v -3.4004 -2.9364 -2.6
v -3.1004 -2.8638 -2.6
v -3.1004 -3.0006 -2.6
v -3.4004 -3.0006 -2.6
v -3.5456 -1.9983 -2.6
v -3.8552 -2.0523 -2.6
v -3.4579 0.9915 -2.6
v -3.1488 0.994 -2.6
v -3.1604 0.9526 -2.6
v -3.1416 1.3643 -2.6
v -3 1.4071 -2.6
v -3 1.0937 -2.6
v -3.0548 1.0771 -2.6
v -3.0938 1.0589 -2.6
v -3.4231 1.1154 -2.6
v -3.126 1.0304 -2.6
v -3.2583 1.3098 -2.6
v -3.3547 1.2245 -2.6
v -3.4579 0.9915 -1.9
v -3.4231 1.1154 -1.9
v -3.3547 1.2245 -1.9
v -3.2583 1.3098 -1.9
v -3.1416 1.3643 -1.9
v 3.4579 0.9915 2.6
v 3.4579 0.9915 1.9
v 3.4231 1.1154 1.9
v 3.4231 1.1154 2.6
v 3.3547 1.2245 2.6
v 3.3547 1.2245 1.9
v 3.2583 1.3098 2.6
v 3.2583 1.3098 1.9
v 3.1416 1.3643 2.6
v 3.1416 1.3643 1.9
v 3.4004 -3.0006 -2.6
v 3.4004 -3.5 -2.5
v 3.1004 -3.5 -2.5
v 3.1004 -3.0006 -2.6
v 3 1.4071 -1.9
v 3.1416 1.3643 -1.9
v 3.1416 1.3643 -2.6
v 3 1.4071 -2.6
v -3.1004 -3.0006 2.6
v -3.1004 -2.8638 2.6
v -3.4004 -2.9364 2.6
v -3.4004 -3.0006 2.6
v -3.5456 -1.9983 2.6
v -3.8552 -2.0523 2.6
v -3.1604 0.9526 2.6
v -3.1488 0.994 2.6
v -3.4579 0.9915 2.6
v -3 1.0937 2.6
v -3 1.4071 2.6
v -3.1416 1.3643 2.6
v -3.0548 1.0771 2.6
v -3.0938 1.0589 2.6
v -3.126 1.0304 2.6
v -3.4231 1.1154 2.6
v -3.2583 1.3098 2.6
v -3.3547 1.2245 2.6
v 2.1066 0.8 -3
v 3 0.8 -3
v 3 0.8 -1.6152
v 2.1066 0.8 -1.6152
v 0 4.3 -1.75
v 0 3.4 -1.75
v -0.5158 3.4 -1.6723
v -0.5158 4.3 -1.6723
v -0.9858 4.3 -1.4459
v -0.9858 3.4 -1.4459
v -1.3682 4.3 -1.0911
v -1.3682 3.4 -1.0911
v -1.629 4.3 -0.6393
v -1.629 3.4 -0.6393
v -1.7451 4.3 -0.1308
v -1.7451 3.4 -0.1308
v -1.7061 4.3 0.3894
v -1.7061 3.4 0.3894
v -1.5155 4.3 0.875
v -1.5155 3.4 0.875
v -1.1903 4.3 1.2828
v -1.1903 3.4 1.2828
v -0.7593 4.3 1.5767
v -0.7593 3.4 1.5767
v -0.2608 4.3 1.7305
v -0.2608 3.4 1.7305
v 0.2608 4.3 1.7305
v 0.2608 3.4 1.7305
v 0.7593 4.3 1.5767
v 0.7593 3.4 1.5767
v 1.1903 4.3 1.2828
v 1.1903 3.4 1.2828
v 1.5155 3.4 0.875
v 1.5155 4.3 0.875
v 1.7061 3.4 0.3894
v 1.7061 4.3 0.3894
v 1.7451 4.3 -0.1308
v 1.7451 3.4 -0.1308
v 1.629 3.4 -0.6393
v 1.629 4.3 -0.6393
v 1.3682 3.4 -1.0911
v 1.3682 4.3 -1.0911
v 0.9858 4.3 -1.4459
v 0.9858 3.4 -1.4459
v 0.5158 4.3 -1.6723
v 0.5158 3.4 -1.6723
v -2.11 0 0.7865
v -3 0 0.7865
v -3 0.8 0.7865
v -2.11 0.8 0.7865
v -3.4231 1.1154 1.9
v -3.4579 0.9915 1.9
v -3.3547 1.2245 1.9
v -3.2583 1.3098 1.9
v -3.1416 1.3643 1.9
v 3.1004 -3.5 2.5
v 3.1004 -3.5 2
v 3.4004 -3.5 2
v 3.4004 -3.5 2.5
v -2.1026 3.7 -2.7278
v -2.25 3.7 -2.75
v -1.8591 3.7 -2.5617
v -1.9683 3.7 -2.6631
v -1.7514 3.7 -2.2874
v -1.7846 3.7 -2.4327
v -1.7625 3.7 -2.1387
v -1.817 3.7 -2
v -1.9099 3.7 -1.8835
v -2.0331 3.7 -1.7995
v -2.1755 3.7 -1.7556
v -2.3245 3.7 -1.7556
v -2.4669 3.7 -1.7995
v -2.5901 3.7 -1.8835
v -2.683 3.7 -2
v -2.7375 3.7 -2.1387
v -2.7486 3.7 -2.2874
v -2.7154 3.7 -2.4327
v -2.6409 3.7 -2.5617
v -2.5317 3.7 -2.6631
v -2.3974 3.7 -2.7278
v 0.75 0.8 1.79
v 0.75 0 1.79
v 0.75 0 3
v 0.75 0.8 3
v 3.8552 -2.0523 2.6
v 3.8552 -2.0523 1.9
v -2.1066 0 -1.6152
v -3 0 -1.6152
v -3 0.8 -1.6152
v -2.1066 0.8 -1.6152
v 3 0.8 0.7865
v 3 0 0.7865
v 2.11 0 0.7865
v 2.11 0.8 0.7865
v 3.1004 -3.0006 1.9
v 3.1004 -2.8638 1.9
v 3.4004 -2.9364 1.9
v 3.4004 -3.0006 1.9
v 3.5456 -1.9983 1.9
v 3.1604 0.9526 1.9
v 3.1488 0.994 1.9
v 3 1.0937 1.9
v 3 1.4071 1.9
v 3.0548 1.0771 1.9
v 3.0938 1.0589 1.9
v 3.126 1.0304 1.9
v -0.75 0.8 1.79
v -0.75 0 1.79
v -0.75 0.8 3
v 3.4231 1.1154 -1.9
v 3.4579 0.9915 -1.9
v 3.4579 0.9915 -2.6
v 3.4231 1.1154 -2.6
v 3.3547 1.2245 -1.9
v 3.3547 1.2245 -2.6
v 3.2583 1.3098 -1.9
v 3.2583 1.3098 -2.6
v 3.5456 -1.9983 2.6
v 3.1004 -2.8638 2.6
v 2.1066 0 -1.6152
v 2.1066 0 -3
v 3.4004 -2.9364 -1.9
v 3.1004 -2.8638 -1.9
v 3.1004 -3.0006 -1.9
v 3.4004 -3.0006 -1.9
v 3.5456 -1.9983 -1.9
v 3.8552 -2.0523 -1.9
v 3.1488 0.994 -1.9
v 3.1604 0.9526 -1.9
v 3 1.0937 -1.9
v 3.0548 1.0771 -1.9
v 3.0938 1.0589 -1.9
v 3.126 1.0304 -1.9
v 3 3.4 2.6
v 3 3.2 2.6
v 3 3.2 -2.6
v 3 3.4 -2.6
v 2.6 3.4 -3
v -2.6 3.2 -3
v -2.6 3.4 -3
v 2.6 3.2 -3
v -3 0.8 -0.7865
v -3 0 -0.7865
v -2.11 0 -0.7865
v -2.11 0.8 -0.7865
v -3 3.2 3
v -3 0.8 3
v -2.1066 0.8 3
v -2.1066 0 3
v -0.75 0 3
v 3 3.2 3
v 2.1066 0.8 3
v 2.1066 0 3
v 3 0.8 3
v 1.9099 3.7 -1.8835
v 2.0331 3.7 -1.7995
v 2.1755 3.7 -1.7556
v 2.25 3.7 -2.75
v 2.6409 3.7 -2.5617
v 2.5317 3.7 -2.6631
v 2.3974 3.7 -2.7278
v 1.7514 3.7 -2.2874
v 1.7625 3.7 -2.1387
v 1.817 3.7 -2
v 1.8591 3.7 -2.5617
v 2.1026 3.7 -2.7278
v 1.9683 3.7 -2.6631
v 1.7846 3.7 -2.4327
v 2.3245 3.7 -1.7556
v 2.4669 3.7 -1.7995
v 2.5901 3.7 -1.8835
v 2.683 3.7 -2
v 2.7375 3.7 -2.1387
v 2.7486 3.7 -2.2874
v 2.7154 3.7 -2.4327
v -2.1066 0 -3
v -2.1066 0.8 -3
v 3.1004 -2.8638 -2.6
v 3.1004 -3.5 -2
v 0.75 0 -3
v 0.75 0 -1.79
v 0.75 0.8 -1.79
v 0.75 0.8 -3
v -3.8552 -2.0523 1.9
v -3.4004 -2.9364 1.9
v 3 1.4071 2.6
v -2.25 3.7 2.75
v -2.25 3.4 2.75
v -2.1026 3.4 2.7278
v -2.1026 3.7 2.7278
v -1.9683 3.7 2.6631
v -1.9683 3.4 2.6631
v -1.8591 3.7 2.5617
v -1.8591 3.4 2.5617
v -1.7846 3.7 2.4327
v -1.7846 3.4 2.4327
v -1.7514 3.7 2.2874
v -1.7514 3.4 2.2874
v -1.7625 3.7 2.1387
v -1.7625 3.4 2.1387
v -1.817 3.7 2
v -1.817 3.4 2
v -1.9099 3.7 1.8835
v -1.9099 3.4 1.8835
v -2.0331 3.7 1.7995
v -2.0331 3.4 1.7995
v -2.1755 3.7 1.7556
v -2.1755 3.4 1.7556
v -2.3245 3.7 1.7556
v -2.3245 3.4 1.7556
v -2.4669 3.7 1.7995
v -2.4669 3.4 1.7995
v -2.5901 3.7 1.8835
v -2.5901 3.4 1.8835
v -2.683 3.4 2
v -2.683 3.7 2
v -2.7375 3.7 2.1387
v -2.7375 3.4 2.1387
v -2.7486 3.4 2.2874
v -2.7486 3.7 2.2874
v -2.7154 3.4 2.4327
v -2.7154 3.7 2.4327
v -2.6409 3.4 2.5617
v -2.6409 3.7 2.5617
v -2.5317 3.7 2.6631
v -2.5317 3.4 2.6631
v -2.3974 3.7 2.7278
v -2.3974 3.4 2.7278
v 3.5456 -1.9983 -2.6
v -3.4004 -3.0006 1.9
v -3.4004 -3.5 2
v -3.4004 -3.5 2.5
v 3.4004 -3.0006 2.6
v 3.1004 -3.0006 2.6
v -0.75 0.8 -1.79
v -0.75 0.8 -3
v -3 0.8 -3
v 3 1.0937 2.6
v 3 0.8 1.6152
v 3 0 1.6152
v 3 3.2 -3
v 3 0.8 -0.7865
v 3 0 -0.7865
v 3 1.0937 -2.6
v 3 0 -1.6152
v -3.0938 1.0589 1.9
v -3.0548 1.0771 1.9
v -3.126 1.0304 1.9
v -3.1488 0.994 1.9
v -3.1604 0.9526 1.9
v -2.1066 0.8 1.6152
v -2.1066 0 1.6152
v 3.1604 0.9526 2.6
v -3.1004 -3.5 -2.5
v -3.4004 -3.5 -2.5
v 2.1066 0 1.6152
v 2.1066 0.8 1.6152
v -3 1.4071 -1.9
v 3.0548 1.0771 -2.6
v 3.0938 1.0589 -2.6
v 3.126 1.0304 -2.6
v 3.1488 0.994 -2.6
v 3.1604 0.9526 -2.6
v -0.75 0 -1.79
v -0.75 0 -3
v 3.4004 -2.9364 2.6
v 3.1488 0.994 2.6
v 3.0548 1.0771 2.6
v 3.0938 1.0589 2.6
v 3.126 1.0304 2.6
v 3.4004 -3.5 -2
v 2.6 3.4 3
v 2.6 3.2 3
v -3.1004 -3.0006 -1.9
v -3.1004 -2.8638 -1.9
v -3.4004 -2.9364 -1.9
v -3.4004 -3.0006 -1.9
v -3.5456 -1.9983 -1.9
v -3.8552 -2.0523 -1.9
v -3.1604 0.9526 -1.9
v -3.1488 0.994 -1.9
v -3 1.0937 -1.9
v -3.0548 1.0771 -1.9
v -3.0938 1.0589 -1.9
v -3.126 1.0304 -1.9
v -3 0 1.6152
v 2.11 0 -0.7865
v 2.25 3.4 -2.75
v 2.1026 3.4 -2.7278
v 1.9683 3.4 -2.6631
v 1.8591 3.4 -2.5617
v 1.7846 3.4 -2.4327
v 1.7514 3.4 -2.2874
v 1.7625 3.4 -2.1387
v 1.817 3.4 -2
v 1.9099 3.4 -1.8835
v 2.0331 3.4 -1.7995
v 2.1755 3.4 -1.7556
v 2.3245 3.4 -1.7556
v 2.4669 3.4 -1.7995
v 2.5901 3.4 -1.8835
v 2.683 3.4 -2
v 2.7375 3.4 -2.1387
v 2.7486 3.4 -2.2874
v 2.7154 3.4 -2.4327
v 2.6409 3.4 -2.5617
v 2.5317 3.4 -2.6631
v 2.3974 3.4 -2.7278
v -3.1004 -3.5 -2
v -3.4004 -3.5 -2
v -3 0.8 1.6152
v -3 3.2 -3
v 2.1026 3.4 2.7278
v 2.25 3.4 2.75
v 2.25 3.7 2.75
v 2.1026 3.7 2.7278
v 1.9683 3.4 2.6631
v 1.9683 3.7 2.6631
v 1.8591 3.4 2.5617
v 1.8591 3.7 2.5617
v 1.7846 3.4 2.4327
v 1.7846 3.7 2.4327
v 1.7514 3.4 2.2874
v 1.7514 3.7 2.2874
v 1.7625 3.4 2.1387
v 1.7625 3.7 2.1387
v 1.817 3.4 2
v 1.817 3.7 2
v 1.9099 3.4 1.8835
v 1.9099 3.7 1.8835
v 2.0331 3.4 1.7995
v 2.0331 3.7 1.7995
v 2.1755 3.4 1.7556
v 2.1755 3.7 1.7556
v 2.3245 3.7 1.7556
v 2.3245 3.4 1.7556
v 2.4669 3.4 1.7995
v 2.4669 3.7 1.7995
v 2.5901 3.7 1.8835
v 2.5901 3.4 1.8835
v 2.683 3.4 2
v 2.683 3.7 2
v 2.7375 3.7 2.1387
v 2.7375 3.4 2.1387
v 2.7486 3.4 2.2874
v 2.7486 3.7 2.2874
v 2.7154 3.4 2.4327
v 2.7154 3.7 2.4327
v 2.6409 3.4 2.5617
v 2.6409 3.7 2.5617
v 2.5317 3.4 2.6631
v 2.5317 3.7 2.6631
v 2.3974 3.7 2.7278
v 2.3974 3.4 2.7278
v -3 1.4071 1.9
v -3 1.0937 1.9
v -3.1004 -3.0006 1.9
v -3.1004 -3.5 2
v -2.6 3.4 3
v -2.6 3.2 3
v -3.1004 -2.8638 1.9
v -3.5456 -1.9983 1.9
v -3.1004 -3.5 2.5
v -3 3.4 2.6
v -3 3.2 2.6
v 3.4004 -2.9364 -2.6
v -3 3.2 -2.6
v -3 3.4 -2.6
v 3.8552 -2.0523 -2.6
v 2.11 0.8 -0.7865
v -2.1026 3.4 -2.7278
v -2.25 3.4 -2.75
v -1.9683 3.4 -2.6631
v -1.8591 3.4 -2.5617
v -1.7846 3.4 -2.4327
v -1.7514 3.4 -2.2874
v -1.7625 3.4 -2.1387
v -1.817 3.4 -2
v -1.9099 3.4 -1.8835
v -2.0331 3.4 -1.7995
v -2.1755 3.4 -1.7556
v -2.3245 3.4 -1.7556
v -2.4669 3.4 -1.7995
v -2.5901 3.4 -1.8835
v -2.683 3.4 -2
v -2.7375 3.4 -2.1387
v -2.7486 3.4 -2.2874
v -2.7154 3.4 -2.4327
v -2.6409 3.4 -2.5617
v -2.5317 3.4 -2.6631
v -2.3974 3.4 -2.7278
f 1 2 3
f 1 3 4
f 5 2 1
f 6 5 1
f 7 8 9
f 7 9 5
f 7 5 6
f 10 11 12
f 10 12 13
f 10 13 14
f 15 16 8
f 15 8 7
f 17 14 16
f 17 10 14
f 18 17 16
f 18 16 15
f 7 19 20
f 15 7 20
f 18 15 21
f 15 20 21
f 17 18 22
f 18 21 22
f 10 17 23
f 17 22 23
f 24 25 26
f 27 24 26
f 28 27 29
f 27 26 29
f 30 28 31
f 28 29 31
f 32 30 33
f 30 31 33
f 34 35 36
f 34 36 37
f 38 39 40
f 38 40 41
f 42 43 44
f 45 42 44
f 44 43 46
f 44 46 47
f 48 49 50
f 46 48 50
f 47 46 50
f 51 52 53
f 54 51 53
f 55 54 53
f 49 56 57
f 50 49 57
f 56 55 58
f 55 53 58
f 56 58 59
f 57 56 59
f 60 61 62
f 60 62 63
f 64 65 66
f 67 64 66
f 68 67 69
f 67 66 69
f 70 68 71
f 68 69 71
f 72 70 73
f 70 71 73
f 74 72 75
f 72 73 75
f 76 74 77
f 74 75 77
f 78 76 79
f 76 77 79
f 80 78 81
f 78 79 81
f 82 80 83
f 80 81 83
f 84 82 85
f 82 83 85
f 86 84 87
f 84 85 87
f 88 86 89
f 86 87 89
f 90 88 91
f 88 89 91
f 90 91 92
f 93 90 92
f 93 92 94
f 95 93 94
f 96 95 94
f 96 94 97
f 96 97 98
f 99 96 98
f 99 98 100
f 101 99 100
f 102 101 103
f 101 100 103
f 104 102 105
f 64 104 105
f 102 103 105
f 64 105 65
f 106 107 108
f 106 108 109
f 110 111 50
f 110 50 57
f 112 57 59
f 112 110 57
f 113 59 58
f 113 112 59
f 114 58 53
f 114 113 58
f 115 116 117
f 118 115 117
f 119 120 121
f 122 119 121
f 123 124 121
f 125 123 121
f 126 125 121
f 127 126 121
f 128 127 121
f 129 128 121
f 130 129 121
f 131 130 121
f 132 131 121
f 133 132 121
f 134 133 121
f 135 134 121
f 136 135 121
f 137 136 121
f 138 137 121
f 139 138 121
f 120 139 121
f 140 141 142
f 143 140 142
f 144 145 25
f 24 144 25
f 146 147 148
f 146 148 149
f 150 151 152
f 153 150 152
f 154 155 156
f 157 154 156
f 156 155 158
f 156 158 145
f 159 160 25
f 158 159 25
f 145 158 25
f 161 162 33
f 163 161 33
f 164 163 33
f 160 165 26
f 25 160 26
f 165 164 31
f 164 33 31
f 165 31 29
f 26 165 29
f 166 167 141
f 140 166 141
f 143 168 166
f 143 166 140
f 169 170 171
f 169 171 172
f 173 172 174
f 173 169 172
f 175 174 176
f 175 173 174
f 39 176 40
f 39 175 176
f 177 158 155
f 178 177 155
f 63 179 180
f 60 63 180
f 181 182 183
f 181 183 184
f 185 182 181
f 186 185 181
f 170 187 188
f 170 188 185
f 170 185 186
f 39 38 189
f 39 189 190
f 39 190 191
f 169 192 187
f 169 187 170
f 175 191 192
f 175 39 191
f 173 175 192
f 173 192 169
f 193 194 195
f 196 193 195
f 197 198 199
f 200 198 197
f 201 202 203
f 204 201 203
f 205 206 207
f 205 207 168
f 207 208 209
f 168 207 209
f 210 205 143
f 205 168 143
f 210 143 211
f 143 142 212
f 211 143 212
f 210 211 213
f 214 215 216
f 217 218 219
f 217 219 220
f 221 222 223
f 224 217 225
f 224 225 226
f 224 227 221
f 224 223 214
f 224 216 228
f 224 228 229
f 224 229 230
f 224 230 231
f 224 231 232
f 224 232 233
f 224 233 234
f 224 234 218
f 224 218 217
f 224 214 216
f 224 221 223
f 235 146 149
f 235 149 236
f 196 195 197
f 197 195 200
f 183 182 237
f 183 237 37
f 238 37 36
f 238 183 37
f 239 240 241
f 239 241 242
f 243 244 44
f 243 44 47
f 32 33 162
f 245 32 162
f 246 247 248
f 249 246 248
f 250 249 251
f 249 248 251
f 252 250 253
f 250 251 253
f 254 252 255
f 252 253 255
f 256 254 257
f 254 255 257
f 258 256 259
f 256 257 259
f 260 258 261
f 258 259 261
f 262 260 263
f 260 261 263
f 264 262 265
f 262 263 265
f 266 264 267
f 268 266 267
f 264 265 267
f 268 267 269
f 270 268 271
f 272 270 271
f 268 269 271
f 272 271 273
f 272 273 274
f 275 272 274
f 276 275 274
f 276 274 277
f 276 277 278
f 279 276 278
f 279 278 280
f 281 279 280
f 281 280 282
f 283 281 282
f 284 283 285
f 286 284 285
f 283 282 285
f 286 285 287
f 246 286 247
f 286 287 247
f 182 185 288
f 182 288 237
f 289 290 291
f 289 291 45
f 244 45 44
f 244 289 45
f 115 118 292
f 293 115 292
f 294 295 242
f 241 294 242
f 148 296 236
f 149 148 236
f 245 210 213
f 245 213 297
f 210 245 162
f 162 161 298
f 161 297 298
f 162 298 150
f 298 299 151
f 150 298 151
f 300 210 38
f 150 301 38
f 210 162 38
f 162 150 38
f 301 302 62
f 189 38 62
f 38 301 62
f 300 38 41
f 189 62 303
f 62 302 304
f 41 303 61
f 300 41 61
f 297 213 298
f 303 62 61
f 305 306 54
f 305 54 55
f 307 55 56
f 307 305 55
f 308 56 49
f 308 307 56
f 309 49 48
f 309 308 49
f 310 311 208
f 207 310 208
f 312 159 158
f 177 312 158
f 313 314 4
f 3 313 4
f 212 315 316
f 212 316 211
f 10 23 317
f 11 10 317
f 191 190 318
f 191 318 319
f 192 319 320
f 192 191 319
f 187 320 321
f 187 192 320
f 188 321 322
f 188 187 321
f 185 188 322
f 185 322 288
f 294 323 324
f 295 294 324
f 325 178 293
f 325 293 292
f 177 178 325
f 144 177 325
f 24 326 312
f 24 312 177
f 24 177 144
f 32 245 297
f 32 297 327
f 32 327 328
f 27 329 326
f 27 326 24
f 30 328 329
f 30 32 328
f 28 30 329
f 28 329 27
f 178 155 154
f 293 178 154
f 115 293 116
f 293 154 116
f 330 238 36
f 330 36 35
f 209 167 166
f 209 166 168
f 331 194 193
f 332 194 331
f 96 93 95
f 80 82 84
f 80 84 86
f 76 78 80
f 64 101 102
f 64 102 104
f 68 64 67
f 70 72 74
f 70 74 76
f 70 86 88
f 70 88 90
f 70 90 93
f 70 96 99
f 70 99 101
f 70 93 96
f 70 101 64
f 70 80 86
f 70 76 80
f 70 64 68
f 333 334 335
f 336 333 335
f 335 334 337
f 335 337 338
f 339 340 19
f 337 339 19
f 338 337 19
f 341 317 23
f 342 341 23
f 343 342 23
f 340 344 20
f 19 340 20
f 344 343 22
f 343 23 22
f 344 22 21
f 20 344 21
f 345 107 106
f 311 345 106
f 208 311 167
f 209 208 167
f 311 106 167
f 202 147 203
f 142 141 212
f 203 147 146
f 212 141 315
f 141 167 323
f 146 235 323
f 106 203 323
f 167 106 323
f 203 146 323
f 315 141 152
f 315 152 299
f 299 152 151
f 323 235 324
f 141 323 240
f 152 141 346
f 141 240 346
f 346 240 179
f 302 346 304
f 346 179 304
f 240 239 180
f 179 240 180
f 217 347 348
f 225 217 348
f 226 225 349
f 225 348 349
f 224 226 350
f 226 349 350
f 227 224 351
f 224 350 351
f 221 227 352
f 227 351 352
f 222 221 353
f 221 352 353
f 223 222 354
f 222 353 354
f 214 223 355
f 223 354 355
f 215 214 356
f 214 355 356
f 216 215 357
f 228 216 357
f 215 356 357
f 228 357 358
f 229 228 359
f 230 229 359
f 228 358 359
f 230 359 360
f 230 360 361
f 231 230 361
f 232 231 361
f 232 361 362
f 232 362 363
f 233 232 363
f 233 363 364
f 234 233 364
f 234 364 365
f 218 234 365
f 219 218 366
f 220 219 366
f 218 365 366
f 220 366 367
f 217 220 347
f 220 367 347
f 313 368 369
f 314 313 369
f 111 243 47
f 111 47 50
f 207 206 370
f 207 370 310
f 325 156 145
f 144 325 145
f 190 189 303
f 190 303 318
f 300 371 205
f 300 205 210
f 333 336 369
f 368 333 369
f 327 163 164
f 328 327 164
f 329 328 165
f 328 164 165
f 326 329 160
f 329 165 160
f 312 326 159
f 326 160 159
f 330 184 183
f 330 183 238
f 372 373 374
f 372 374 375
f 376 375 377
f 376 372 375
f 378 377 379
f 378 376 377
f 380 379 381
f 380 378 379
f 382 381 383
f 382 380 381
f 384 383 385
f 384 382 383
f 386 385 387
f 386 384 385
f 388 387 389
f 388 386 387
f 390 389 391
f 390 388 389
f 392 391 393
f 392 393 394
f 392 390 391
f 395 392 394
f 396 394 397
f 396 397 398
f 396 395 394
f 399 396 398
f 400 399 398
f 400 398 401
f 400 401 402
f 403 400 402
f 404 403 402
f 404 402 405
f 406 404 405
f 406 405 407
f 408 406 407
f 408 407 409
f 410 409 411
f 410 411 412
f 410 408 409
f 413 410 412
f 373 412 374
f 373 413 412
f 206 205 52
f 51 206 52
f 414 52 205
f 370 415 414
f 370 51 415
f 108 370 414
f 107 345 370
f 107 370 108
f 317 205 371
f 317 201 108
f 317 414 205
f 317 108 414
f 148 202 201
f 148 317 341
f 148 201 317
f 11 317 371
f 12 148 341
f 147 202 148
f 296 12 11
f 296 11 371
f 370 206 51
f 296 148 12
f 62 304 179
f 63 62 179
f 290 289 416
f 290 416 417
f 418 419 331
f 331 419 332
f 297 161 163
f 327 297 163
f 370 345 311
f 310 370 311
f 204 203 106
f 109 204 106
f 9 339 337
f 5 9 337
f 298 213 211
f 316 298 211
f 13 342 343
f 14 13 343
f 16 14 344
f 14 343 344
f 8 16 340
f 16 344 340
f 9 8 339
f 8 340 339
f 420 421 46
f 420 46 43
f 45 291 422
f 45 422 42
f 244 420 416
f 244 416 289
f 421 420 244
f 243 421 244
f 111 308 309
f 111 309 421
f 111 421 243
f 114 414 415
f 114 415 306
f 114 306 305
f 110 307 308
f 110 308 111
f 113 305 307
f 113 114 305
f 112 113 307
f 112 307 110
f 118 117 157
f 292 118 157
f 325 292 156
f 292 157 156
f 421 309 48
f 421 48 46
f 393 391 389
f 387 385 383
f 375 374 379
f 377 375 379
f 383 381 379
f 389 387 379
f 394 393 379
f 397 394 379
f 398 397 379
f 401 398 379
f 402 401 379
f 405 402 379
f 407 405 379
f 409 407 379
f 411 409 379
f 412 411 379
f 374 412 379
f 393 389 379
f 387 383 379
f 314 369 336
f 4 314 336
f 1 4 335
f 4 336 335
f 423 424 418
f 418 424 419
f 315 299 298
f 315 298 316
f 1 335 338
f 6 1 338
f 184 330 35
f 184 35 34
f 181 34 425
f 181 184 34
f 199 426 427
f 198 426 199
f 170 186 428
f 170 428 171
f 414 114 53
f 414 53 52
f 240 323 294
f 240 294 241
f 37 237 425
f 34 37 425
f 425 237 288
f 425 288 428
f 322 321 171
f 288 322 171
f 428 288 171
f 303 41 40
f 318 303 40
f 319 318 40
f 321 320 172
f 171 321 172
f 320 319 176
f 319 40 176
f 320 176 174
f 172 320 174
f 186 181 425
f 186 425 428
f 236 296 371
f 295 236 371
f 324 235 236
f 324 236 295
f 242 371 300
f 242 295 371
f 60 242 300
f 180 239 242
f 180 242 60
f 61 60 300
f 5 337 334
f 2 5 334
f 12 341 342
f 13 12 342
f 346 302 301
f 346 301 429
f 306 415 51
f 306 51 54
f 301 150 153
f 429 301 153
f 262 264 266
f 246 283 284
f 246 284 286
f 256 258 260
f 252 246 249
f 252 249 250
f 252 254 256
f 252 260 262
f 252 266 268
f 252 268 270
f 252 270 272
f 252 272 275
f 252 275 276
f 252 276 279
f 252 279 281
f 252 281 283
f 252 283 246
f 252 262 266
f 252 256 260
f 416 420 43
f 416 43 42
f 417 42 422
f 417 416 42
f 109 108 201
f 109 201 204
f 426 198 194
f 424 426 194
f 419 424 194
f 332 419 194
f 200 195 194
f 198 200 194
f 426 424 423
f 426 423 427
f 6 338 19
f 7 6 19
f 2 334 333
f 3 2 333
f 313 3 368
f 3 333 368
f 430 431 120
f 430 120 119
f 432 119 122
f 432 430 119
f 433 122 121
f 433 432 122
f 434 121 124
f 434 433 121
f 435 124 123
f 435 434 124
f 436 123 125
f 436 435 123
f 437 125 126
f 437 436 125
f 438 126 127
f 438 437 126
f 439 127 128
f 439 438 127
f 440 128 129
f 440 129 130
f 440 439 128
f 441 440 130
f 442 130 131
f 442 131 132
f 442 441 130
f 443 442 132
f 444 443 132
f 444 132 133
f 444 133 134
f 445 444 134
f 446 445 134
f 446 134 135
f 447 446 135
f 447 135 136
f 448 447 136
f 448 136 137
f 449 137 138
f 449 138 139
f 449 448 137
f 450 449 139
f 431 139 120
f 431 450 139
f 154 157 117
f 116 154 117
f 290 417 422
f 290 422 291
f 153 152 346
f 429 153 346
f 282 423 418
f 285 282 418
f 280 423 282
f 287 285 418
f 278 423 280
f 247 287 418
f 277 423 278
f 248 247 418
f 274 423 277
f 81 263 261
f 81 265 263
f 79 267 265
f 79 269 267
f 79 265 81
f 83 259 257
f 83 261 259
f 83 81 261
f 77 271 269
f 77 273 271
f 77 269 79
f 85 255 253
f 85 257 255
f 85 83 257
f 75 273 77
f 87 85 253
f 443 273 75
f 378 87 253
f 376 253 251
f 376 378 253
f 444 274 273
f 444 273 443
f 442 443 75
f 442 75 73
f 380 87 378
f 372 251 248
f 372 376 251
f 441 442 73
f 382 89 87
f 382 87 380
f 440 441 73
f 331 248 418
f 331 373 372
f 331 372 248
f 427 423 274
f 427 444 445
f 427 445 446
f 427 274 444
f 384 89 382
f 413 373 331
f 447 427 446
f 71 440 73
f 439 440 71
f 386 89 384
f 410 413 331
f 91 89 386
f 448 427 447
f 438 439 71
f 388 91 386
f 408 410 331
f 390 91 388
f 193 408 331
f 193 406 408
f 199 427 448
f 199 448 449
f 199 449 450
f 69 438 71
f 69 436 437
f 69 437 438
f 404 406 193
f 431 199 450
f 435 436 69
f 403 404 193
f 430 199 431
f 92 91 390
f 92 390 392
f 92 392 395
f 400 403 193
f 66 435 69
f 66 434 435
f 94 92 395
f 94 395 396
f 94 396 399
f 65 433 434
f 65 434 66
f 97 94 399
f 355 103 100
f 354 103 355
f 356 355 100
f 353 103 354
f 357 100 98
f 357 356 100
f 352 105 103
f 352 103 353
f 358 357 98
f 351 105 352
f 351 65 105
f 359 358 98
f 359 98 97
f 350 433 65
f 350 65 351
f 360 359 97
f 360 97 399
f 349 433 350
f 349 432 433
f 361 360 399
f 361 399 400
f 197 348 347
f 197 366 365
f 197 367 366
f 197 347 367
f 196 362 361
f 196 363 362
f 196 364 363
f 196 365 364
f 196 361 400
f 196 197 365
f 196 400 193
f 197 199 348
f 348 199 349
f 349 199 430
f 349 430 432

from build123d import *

# Parameters (mm, degrees)
CROQUIS1_W                  = 6
CROQUIS1_H                  = 6
SALIENTE_EXTRUIR1_DEPTH     = 3.4
CROQUIS2_R                  = 1.75
SALIENTE_EXTRUIR2_DEPTH     = 0.9
BARRER6_START               = 1.9
BARRER6_DEPTH               = 0.7
SIMETR_A2_START             = 1.9
SIMETR_A2_COPY_1_DEPTH      = 0.7
CROQUIS3_R                  = 0.5
SALIENTE_EXTRUIR6_DEPTH     = 0.3
SIMETR_A4_COPY_1_SKETCH_R   = 0.5
SIMETR_A4_COPY_1_DEPTH      = 0.3
CORTAR_EXTRUIR1_START       = -0.2
CORTAR_EXTRUIR1_DEPTH       = 9.654133443
SIMETR_A6_START             = -0.2
SIMETR_A6_COPY_1_DEPTH      = 9.654133443
CROQUIS13_W                 = 1.499904498
CROQUIS13_H                 = 1.21
CORTAR_EXTRUIR2_DEPTH       = 0.8
CROQUIS13_3_W               = 0.893400265
CROQUIS13_3_H               = 1.384843815
CROQUIS13_3_W_2             = 0.89
CROQUIS13_3_H_2             = 0.786473886
CORTAR_EXTRUIR3_DEPTH       = 0.8
SIMETR_A9_COPY_1_SKETCH_W   = 0.893400265
SIMETR_A9_COPY_1_SKETCH_H   = 1.384843815
SIMETR_A9_COPY_1_SKETCH_W_2 = 0.89
SIMETR_A9_COPY_1_SKETCH_H_2 = 0.786473886
SIMETR_A9_COPY_1_DEPTH      = 0.8
CORTAR_EXTRUIR4_DEPTH       = 0.3
SIMETR_A11_COPY_1_DEPTH     = 0.3


# Read off the part's stored shape, not the designer's step: Barrer6
with BuildPart() as part:
    # Croquis1 → Saliente-Extruir1 (new body)
    with BuildSketch(Plane(origin=(0, 0, 0), x_dir=(1, 0, 0), z_dir=(0, 1, 0))):
        Rectangle(CROQUIS1_W, CROQUIS1_H)
    extrude(amount=SALIENTE_EXTRUIR1_DEPTH)

    # Croquis2 → Saliente-Extruir2 (add)
    with BuildSketch(Plane(origin=(0, 3.4, 0), x_dir=(1, 0, 0), z_dir=(0, 1, 0))):
        with Locations(Location((0, 0, 0), (0, 0, 90))):
            Circle(CROQUIS2_R)
    extrude(amount=SALIENTE_EXTRUIR2_DEPTH)

    # Barrer6 outline → Barrer6 (add)
    with BuildSketch(Plane.XY.offset(BARRER6_START)):
        with BuildLine():
            Line((3, 1.407087545), (3, 1.0936793))
            Line((3, 1.0936793), (3.054816861, 1.077108111))
            ThreePointArc((3.054816861, 1.077108111), (3.12597159, 1.030446512), (3.160407685, 0.952636129))
            Line((3.160407685, 0.952636129), (3.545582768, -1.998261735))
            Line((3.545582768, -1.998261735), (3.100367019, -2.863770693))
            Line((3.100367019, -2.863770693), (3.100367019, -3.5))
            Line((3.100367019, -3.5), (3.400367019, -3.5))
            Line((3.400367019, -3.5), (3.400367019, -2.936407033))
            Line((3.400367019, -2.936407033), (3.855174739, -2.052251079))
            Line((3.855174739, -2.052251079), (3.457884247, 0.991465178))
            ThreePointArc((3.457884247, 0.991465178), (3.354744065, 1.224516485), (3.141627229, 1.364273499))
            Line((3.141627229, 1.364273499), (3, 1.407087545))
        make_face()
    barrer6 = extrude(amount=BARRER6_DEPTH)

    # Simetría1: Barrer6 across plane
    add(barrer6.mirror(Plane.XY))

    # Simetría2: Barrer6 across plane
    add(barrer6.mirror(Plane(origin=(0, 0, 0), x_dir=(0, 0, 1), z_dir=(1, 0, 0))))

    # Simetría2 copy 1 sketch → Simetría2 copy 1 (add)
    with BuildSketch(Plane(origin=(0, 0, 0), x_dir=(-1, 0, 0), z_dir=(0, 0, -1)).offset(SIMETR_A2_START)):
        with BuildLine():
            Line((3, 1.407087545), (3, 1.0936793))
            Line((3, 1.0936793), (3.054816861, 1.077108111))
            ThreePointArc((3.054816861, 1.077108111), (3.12597159, 1.030446512), (3.160407685, 0.952636129))
            Line((3.160407685, 0.952636129), (3.545582768, -1.998261735))
            Line((3.545582768, -1.998261735), (3.100367019, -2.863770693))
            Line((3.100367019, -2.863770693), (3.100367019, -3.5))
            Line((3.100367019, -3.5), (3.400367019, -3.5))
            Line((3.400367019, -3.5), (3.400367019, -2.936407033))
            Line((3.400367019, -2.936407033), (3.855174739, -2.052251079))
            Line((3.855174739, -2.052251079), (3.457884247, 0.991465178))
            ThreePointArc((3.457884247, 0.991465178), (3.354744065, 1.224516485), (3.141627229, 1.364273499))
            Line((3.141627229, 1.364273499), (3, 1.407087545))
        make_face()
    extrude(amount=SIMETR_A2_COPY_1_DEPTH)

    # Croquis3 → Saliente-Extruir6 (add)
    with BuildSketch(Plane(origin=(0, 3.4, 0), x_dir=(1, 0, 0), z_dir=(0, 1, 0))):
        with Locations(Location((2.25, 2.25, 0), (0, 0, 90))):
            Circle(CROQUIS3_R)
    saliente_extruir6 = extrude(amount=SALIENTE_EXTRUIR6_DEPTH)

    # Simetría3: Saliente-Extruir6 across plane
    add(saliente_extruir6.mirror(Plane(origin=(0, 0, 0), x_dir=(0, 0, 1), z_dir=(1, 0, 0))))

    # Simetría4: Saliente-Extruir6 across plane
    add(saliente_extruir6.mirror(Plane.XY))

    # Simetría4 copy 1 sketch → Simetría4 copy 1 (add)
    with BuildSketch(Plane(origin=(0, 3.4, 0), x_dir=(-1, 0, 0), z_dir=(0, 1, 0))):
        with Locations(Location((2.25, 2.25, 0), (0, 0, 90))):
            Circle(SIMETR_A4_COPY_1_SKETCH_R)
    extrude(amount=SIMETR_A4_COPY_1_DEPTH)

    # Croquis12 → Cortar-Extruir1 (cut)
    with BuildSketch(Plane(origin=(0, 3.4, 0), x_dir=(1, 0, 0), z_dir=(0, 1, 0)).offset(CORTAR_EXTRUIR1_START)):
        Polygon((-22.58932813, -16.98932813), (-3, 2.6), (-2.6, 3), (16.98932813, 22.58932813), (-22.18932813, 61.767984391), (-61.767984391, 22.18932813), align=None)
    cortar_extruir1 = extrude(amount=CORTAR_EXTRUIR1_DEPTH, mode=Mode.SUBTRACT)

    # Simetría5: Cortar-Extruir1 across plane
    add(cortar_extruir1.mirror(Plane.XY), mode=Mode.SUBTRACT)

    # Simetría6: Cortar-Extruir1 across plane
    add(cortar_extruir1.mirror(Plane(origin=(0, 0, 0), x_dir=(0, 0, 1), z_dir=(1, 0, 0))), mode=Mode.SUBTRACT)

    # Simetría6 copy 1 sketch → Simetría6 copy 1 (cut)
    with BuildSketch(Plane(origin=(0, 3.4, 0), x_dir=(-1, 0, 0), z_dir=(0, 1, 0)).offset(SIMETR_A6_START)):
        Polygon((-22.58932813, -16.98932813), (-3, 2.6), (-2.6, 3), (16.98932813, 22.58932813), (-22.18932813, 61.767984391), (-61.767984391, 22.18932813), align=None)
    extrude(amount=SIMETR_A6_COPY_1_DEPTH, mode=Mode.SUBTRACT)


with BuildPart() as body_2:
    # Partir1: the piece on the far side of the plane
    add(part.part)
    split(bisect_by=Plane.ZX.offset(3.2), keep=Keep.BOTTOM)

    # Croquis13 → Cortar-Extruir2 (cut)
    with BuildSketch(Plane.XZ):
        with Locations((0, 2.395)):
            Rectangle(CROQUIS13_W, CROQUIS13_H)
    cortar_extruir2 = extrude(amount=-CORTAR_EXTRUIR2_DEPTH, mode=Mode.SUBTRACT)

    # Simetría7: Cortar-Extruir2 across plane
    add(cortar_extruir2.mirror(Plane.XY), mode=Mode.SUBTRACT)

    # Croquis13<3> → Cortar-Extruir3 (cut)
    with BuildSketch(Plane.XZ):
        with Locations((-2.553299867, 2.307578093)):
            Rectangle(CROQUIS13_3_W, CROQUIS13_3_H)
        with Locations((-2.555, 0.393236943)):
            Rectangle(CROQUIS13_3_W_2, CROQUIS13_3_H_2)
    cortar_extruir3 = extrude(amount=-CORTAR_EXTRUIR3_DEPTH, mode=Mode.SUBTRACT)

    # Simetría8: Cortar-Extruir3 across plane
    add(cortar_extruir3.mirror(Plane.XY), mode=Mode.SUBTRACT)

    # Simetría9: Cortar-Extruir3 across plane
    add(cortar_extruir3.mirror(Plane(origin=(0, 0, 0), x_dir=(0, 0, 1), z_dir=(1, 0, 0))), mode=Mode.SUBTRACT)

    # Simetría9 copy 1 sketch → Simetría9 copy 1 (cut)
    with BuildSketch(Plane(origin=(0, 0, 0), x_dir=(-1, 0, 0), z_dir=(0, -1, 0))):
        with Locations((-2.553299867, 2.307578093)):
            Rectangle(SIMETR_A9_COPY_1_SKETCH_W, SIMETR_A9_COPY_1_SKETCH_H)
        with Locations((-2.555, 0.393236943)):
            Rectangle(SIMETR_A9_COPY_1_SKETCH_W_2, SIMETR_A9_COPY_1_SKETCH_H_2)
    extrude(amount=-SIMETR_A9_COPY_1_DEPTH, mode=Mode.SUBTRACT)

    # Croquis14 → Cortar-Extruir4 (cut)
    with BuildSketch(Plane(origin=(3.400367019, 0, 0), x_dir=(0, 0, -1), z_dir=(1, 0, 0))):
        Polygon((-2.6, -3.5), (-2.5, -3.5), (-2.6, -3.000601878), align=None)
        Polygon((-1.9, -3.000601878), (-2, -3.5), (-1.9, -3.5), align=None)
    cortar_extruir4 = extrude(amount=-CORTAR_EXTRUIR4_DEPTH, mode=Mode.SUBTRACT)

    # Simetría10: Cortar-Extruir4 across plane
    add(cortar_extruir4.mirror(Plane.XY), mode=Mode.SUBTRACT)

    # Simetría11: Cortar-Extruir4 across plane
    add(cortar_extruir4.mirror(Plane(origin=(0, 0, 0), x_dir=(0, 0, 1), z_dir=(1, 0, 0))), mode=Mode.SUBTRACT)

    # Simetría11 copy 1 sketch → Simetría11 copy 1 (cut)
    with BuildSketch(Plane.ZY.offset(3.400367019)):
        Polygon((-2.6, -3.5), (-2.5, -3.5), (-2.6, -3.000601878), align=None)
        Polygon((-1.9, -3.000601878), (-2, -3.5), (-1.9, -3.5), align=None)
    extrude(amount=-SIMETR_A11_COPY_1_DEPTH, mode=Mode.SUBTRACT)


with BuildPart() as part_1:
    add(part.part)

    # Partir1
    split(bisect_by=Plane.ZX.offset(3.2), keep=Keep.TOP)


solid = Compound([body_2.part, part_1.part])
